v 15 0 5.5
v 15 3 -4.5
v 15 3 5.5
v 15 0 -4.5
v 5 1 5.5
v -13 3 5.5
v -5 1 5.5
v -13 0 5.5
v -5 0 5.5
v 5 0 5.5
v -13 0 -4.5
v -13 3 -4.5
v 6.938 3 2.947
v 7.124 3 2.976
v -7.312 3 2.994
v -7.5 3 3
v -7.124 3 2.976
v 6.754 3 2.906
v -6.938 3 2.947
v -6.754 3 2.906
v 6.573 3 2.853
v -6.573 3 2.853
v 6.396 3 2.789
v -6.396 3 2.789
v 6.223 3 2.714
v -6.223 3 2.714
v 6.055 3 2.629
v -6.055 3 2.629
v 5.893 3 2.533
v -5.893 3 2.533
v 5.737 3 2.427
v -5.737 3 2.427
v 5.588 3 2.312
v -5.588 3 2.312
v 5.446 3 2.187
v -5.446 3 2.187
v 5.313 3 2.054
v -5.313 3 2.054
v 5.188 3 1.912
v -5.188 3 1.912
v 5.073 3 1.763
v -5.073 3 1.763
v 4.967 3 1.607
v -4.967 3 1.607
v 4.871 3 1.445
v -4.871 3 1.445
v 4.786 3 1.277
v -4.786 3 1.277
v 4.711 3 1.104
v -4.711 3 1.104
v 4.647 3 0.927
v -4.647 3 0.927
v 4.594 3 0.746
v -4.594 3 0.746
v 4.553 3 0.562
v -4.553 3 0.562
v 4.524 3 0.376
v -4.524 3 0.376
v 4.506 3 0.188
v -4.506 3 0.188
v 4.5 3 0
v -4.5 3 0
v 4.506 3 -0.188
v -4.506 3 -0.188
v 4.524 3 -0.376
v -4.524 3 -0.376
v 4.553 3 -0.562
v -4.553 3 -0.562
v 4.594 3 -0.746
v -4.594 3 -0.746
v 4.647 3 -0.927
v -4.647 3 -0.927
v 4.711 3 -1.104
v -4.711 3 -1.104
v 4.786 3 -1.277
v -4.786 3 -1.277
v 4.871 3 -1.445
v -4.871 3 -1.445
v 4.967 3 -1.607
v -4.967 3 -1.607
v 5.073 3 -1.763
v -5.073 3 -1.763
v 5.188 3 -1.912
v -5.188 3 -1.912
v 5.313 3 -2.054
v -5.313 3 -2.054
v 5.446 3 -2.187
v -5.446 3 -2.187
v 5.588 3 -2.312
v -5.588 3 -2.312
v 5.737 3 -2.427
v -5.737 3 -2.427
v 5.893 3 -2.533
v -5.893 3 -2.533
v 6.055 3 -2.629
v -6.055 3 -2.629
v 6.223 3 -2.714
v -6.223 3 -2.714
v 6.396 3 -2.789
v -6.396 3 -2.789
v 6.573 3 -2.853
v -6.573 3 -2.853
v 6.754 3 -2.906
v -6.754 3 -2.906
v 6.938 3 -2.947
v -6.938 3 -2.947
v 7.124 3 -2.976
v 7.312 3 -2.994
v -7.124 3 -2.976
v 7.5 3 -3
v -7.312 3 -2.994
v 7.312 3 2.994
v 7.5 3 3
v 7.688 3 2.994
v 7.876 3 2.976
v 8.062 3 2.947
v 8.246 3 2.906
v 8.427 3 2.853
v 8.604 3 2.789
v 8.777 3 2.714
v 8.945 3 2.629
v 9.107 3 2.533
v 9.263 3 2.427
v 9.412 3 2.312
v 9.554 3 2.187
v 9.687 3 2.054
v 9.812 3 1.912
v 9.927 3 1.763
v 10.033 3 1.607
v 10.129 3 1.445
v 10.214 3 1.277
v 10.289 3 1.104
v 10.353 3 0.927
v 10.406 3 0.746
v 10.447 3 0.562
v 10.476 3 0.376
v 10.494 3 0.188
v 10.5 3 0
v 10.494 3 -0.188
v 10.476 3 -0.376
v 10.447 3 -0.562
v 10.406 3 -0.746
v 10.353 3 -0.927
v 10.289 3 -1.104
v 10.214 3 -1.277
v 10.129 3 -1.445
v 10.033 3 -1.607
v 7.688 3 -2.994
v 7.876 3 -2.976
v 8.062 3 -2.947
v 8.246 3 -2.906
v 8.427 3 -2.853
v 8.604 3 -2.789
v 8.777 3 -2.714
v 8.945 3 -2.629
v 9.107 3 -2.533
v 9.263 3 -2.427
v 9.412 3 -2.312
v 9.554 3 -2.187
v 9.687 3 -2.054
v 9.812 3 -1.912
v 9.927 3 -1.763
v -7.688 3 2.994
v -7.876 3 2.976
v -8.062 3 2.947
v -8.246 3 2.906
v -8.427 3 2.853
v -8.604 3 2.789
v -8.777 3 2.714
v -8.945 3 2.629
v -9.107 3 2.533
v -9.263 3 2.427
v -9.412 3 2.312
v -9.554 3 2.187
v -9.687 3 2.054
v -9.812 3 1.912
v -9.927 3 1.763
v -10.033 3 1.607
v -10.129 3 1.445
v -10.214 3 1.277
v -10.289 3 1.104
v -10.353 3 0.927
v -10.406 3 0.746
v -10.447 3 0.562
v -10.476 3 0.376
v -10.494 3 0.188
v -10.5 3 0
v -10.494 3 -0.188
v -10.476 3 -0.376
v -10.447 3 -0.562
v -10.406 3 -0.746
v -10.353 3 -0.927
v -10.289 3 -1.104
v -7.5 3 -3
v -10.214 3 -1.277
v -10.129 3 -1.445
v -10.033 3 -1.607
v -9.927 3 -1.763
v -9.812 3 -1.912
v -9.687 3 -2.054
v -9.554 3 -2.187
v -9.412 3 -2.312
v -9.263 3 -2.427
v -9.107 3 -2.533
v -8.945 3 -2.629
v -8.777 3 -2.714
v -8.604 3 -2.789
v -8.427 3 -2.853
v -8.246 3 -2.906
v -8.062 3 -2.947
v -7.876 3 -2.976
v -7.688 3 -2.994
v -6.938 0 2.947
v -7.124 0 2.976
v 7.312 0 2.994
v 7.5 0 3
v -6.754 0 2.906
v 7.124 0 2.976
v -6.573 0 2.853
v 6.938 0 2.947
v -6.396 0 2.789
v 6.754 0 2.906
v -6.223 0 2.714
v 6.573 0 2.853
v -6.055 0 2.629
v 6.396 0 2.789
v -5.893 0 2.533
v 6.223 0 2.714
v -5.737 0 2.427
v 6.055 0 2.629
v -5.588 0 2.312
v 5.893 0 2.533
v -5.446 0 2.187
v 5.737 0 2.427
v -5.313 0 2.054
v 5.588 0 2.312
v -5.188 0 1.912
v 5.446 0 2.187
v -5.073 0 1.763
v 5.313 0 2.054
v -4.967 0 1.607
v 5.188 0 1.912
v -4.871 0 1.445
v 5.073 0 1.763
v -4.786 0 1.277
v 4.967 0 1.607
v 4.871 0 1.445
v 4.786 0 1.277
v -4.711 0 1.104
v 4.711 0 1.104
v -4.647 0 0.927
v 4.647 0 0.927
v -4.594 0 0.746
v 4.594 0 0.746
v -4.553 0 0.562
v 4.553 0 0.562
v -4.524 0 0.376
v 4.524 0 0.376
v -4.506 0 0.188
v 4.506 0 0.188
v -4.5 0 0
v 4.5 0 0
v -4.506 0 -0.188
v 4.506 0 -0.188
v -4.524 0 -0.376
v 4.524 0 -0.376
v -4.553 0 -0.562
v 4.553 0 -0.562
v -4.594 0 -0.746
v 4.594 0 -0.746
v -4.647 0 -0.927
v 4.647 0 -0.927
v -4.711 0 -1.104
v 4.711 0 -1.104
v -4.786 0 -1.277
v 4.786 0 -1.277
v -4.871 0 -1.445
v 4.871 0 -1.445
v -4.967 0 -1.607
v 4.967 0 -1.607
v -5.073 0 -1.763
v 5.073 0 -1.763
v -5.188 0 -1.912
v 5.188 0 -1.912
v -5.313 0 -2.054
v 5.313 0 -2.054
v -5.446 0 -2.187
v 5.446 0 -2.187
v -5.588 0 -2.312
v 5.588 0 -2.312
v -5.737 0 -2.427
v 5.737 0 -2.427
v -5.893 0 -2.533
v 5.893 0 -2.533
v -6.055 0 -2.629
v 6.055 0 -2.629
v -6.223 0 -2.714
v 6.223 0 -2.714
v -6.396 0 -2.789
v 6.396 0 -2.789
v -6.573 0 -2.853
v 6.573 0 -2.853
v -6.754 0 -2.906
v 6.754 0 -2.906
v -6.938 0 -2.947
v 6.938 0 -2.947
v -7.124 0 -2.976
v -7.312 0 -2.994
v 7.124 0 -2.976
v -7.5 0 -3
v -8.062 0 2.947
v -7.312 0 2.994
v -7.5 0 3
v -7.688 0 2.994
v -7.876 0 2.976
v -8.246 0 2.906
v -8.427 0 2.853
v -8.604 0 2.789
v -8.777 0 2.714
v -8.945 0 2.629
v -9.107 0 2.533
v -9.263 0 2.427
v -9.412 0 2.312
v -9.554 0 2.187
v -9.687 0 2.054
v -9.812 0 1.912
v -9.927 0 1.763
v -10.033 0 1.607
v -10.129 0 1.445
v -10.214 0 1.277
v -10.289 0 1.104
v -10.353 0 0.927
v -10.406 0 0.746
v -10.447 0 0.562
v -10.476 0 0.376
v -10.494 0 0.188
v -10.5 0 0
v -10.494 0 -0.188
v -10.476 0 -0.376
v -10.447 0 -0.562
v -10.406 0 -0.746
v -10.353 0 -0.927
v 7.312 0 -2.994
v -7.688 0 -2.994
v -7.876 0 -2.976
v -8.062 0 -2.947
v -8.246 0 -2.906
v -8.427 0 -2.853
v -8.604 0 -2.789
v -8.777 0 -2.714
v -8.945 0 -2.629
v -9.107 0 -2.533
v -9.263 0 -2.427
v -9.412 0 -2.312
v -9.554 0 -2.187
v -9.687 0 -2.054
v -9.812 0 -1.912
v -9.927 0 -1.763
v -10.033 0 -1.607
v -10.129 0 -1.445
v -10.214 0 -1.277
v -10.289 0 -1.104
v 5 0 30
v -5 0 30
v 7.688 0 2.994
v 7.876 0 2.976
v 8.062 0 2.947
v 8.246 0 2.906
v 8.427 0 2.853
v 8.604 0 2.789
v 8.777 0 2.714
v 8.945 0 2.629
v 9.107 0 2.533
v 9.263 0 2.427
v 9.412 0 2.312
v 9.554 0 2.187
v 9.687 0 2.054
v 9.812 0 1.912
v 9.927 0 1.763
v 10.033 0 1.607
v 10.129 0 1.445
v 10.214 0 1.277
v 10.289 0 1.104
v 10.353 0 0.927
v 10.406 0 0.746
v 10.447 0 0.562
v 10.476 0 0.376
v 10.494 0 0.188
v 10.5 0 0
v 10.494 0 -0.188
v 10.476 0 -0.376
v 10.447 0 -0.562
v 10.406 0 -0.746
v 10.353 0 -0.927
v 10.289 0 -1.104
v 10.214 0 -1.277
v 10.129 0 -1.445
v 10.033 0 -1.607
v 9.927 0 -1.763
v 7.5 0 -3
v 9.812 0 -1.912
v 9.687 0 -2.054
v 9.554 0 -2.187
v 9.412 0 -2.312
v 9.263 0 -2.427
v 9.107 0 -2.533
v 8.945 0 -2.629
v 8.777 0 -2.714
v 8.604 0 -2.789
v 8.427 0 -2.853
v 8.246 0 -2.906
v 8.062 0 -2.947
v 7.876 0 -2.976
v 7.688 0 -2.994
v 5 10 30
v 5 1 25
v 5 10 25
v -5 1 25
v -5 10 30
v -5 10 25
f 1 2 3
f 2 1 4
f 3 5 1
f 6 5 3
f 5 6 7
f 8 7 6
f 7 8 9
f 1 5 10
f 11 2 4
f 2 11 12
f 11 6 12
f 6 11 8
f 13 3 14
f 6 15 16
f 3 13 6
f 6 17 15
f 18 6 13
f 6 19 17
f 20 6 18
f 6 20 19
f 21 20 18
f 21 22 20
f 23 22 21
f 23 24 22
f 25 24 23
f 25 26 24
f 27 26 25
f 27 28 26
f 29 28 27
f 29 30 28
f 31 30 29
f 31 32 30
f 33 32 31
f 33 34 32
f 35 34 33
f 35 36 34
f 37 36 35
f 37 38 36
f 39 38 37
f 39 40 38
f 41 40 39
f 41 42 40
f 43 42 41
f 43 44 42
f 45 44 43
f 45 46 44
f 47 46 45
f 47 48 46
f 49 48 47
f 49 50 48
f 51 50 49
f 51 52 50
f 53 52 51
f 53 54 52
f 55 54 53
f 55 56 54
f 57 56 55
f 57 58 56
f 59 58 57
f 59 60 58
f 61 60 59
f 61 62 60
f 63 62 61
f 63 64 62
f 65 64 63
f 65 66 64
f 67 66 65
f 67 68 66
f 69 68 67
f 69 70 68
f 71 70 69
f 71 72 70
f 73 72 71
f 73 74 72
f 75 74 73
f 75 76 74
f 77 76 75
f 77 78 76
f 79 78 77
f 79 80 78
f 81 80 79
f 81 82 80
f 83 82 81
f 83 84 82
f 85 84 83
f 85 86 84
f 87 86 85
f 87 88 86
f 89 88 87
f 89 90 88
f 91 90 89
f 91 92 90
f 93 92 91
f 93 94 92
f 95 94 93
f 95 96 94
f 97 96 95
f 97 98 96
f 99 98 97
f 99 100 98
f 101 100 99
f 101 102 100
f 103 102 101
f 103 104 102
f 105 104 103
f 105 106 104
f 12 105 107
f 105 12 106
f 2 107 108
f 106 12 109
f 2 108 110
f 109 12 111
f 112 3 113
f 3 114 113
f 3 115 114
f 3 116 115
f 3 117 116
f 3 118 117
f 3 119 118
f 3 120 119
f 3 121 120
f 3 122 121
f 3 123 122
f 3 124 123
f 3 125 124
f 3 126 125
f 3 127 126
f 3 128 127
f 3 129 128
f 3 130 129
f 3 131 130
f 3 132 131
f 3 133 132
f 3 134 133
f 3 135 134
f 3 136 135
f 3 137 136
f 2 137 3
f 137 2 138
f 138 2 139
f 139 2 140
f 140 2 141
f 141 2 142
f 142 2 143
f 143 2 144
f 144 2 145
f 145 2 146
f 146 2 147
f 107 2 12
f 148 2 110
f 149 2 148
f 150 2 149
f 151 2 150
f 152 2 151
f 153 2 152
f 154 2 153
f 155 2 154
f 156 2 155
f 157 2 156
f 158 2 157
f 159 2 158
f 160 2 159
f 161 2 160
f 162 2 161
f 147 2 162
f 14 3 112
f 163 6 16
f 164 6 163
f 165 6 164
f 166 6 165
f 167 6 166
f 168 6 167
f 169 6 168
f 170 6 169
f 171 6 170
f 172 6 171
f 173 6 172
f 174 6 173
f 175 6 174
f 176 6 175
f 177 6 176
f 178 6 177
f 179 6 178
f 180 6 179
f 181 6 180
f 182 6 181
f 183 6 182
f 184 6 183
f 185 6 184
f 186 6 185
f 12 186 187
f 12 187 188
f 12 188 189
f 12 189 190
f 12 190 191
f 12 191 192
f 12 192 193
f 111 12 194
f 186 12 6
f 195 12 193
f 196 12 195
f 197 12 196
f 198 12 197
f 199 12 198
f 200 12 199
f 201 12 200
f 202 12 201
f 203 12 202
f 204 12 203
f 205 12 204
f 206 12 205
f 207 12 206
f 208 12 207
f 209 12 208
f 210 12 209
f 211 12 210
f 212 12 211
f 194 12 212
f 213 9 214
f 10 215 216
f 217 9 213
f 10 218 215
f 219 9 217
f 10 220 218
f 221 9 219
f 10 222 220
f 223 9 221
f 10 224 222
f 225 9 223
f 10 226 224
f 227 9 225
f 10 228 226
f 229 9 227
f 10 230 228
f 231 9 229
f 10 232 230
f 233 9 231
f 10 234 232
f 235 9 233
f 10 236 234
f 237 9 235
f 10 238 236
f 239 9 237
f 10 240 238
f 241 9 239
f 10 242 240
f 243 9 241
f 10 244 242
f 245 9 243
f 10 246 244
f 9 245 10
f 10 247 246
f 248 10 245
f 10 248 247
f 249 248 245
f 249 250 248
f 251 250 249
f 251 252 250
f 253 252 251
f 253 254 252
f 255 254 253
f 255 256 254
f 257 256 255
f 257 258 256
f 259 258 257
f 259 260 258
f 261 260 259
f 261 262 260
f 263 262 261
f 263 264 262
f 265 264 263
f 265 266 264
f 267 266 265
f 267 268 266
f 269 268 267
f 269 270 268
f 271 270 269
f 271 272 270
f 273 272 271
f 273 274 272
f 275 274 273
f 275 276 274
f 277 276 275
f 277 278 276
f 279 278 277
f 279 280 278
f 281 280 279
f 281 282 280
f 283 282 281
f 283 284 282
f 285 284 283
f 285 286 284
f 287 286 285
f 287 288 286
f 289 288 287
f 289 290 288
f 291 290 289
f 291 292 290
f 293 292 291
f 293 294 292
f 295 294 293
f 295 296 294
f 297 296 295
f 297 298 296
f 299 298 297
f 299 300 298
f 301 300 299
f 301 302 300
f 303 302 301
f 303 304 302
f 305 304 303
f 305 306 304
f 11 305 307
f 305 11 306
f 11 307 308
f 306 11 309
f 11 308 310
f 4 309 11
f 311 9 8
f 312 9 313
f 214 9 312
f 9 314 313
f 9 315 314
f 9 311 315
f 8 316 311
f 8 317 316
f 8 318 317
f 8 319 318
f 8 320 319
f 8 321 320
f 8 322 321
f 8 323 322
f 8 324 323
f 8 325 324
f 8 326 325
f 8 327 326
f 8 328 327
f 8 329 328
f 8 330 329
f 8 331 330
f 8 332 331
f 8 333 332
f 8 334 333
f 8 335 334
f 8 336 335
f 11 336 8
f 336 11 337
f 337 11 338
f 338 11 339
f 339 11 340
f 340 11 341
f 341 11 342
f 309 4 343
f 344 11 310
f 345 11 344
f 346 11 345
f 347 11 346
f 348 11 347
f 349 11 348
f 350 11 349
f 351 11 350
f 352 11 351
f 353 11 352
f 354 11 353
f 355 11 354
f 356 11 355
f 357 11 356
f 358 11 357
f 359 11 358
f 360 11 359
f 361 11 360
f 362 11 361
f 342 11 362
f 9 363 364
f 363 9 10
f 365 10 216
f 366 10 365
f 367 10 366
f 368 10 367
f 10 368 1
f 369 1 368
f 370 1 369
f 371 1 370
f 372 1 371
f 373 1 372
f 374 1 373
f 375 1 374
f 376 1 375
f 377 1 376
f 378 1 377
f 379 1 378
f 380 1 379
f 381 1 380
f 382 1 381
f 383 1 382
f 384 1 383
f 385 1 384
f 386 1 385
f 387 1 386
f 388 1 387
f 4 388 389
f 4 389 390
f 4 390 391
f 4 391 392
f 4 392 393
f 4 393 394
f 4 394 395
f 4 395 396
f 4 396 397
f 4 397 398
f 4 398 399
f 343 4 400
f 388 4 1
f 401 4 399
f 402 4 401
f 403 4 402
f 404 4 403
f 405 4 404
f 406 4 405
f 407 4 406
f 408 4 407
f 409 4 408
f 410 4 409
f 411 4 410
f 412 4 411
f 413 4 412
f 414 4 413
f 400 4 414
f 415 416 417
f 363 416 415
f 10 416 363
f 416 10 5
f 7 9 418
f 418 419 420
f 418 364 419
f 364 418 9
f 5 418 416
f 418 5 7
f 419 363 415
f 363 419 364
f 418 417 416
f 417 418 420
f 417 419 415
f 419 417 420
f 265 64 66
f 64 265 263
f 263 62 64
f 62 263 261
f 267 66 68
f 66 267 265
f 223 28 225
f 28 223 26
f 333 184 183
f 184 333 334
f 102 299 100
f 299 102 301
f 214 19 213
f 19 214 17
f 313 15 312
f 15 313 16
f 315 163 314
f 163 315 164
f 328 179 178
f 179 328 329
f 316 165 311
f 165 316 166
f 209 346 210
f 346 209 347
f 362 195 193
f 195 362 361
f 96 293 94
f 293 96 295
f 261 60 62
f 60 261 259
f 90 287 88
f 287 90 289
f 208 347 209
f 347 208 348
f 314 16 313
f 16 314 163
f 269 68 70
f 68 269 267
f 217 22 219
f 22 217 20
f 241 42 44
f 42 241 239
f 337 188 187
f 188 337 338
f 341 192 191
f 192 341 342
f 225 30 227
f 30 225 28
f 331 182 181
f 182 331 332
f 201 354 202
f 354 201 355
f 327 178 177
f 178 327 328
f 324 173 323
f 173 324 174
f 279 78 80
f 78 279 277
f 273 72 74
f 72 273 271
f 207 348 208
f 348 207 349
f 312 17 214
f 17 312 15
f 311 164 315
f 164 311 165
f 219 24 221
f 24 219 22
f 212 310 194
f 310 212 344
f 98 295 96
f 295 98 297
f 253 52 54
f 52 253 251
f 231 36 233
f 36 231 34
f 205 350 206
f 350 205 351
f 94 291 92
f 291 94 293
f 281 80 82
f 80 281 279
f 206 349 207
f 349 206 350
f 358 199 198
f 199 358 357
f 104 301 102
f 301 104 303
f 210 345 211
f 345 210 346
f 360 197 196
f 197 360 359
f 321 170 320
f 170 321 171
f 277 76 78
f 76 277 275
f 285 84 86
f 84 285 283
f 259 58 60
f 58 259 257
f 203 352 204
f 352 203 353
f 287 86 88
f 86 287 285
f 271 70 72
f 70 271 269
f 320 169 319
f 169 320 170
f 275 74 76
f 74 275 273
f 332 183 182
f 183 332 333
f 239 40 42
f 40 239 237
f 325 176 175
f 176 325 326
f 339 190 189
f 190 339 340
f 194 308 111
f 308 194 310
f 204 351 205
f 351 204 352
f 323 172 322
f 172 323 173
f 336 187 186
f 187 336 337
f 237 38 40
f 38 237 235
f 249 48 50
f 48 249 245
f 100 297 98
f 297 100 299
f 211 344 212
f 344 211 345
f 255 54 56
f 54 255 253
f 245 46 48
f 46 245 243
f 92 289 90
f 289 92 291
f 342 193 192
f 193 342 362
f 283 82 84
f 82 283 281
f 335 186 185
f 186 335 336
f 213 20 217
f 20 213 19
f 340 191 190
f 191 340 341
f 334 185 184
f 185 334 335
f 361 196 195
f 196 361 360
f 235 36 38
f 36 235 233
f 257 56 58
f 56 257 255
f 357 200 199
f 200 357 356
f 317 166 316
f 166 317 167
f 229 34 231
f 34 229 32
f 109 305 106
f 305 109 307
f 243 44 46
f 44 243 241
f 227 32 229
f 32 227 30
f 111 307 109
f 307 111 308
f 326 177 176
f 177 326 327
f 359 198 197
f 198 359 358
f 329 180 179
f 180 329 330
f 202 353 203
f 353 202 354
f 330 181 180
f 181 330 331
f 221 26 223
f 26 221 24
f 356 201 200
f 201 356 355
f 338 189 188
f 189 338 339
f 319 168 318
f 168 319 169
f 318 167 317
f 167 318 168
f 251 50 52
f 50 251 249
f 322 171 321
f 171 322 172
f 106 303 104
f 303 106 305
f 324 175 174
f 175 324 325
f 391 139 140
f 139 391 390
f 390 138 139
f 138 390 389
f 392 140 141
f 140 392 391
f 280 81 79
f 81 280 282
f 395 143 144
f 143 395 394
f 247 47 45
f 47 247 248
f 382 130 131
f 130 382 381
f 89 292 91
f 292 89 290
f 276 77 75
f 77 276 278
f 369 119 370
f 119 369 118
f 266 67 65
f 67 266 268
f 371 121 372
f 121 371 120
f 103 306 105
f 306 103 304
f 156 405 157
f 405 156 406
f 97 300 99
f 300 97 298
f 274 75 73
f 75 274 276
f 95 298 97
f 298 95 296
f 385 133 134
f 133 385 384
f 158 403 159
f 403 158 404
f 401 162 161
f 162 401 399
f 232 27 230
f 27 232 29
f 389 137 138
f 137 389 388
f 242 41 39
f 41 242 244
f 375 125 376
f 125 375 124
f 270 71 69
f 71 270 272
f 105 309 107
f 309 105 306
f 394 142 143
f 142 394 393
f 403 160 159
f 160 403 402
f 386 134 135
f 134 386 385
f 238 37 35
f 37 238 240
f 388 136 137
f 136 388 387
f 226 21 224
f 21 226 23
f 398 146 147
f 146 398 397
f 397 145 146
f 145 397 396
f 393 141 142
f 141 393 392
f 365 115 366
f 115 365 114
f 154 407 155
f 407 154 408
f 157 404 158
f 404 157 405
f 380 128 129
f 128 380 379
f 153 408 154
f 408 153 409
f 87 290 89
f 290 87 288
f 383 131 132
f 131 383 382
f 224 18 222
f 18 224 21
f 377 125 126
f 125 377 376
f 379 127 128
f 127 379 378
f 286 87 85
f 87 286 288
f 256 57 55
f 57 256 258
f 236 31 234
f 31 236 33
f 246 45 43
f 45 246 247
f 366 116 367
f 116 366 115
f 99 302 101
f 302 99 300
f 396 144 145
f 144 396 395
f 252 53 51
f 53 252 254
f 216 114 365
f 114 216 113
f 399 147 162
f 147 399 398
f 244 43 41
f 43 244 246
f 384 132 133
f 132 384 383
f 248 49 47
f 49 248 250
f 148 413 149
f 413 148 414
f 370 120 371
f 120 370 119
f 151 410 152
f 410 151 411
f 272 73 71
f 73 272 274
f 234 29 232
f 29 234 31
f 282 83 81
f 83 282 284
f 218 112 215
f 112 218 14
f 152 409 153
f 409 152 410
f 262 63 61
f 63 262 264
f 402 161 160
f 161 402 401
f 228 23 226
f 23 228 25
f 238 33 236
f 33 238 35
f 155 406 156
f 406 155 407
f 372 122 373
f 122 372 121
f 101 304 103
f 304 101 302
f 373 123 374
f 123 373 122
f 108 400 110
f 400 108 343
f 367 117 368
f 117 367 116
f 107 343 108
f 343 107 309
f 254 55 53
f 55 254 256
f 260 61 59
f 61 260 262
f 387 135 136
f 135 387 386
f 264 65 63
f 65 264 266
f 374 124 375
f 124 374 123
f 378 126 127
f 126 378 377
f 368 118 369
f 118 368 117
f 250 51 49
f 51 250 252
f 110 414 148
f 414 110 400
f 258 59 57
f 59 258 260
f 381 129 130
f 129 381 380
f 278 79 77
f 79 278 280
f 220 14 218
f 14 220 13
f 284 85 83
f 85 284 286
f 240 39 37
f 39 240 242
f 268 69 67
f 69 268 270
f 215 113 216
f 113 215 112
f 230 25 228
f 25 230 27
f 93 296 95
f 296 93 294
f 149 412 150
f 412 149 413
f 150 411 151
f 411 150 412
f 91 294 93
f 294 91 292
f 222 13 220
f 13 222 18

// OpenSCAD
difference(){
	union(){
        
        translate([-13,0,-4.5]){
            cube([28,3,10], center=false);
        }         
        translate([-5,0,-2.5]){
            cube([10,1,30], center=false);
        }         
        translate([-5,0,25]){
            cube([10,10,5], center=false);
        }         



          
      

	}
	union() {
        translate([-7.5,-1,0]){
            rotate([270,0,0]){
                cylinder(h=25, r=3, $fn=100, center=false);
            }
        }         
        translate([7.5,-1,0]){
            rotate([270,0,0]){
                cylinder(h=25, r=3, $fn=100, center=false);
            }
        }       
//

 

	}
}
